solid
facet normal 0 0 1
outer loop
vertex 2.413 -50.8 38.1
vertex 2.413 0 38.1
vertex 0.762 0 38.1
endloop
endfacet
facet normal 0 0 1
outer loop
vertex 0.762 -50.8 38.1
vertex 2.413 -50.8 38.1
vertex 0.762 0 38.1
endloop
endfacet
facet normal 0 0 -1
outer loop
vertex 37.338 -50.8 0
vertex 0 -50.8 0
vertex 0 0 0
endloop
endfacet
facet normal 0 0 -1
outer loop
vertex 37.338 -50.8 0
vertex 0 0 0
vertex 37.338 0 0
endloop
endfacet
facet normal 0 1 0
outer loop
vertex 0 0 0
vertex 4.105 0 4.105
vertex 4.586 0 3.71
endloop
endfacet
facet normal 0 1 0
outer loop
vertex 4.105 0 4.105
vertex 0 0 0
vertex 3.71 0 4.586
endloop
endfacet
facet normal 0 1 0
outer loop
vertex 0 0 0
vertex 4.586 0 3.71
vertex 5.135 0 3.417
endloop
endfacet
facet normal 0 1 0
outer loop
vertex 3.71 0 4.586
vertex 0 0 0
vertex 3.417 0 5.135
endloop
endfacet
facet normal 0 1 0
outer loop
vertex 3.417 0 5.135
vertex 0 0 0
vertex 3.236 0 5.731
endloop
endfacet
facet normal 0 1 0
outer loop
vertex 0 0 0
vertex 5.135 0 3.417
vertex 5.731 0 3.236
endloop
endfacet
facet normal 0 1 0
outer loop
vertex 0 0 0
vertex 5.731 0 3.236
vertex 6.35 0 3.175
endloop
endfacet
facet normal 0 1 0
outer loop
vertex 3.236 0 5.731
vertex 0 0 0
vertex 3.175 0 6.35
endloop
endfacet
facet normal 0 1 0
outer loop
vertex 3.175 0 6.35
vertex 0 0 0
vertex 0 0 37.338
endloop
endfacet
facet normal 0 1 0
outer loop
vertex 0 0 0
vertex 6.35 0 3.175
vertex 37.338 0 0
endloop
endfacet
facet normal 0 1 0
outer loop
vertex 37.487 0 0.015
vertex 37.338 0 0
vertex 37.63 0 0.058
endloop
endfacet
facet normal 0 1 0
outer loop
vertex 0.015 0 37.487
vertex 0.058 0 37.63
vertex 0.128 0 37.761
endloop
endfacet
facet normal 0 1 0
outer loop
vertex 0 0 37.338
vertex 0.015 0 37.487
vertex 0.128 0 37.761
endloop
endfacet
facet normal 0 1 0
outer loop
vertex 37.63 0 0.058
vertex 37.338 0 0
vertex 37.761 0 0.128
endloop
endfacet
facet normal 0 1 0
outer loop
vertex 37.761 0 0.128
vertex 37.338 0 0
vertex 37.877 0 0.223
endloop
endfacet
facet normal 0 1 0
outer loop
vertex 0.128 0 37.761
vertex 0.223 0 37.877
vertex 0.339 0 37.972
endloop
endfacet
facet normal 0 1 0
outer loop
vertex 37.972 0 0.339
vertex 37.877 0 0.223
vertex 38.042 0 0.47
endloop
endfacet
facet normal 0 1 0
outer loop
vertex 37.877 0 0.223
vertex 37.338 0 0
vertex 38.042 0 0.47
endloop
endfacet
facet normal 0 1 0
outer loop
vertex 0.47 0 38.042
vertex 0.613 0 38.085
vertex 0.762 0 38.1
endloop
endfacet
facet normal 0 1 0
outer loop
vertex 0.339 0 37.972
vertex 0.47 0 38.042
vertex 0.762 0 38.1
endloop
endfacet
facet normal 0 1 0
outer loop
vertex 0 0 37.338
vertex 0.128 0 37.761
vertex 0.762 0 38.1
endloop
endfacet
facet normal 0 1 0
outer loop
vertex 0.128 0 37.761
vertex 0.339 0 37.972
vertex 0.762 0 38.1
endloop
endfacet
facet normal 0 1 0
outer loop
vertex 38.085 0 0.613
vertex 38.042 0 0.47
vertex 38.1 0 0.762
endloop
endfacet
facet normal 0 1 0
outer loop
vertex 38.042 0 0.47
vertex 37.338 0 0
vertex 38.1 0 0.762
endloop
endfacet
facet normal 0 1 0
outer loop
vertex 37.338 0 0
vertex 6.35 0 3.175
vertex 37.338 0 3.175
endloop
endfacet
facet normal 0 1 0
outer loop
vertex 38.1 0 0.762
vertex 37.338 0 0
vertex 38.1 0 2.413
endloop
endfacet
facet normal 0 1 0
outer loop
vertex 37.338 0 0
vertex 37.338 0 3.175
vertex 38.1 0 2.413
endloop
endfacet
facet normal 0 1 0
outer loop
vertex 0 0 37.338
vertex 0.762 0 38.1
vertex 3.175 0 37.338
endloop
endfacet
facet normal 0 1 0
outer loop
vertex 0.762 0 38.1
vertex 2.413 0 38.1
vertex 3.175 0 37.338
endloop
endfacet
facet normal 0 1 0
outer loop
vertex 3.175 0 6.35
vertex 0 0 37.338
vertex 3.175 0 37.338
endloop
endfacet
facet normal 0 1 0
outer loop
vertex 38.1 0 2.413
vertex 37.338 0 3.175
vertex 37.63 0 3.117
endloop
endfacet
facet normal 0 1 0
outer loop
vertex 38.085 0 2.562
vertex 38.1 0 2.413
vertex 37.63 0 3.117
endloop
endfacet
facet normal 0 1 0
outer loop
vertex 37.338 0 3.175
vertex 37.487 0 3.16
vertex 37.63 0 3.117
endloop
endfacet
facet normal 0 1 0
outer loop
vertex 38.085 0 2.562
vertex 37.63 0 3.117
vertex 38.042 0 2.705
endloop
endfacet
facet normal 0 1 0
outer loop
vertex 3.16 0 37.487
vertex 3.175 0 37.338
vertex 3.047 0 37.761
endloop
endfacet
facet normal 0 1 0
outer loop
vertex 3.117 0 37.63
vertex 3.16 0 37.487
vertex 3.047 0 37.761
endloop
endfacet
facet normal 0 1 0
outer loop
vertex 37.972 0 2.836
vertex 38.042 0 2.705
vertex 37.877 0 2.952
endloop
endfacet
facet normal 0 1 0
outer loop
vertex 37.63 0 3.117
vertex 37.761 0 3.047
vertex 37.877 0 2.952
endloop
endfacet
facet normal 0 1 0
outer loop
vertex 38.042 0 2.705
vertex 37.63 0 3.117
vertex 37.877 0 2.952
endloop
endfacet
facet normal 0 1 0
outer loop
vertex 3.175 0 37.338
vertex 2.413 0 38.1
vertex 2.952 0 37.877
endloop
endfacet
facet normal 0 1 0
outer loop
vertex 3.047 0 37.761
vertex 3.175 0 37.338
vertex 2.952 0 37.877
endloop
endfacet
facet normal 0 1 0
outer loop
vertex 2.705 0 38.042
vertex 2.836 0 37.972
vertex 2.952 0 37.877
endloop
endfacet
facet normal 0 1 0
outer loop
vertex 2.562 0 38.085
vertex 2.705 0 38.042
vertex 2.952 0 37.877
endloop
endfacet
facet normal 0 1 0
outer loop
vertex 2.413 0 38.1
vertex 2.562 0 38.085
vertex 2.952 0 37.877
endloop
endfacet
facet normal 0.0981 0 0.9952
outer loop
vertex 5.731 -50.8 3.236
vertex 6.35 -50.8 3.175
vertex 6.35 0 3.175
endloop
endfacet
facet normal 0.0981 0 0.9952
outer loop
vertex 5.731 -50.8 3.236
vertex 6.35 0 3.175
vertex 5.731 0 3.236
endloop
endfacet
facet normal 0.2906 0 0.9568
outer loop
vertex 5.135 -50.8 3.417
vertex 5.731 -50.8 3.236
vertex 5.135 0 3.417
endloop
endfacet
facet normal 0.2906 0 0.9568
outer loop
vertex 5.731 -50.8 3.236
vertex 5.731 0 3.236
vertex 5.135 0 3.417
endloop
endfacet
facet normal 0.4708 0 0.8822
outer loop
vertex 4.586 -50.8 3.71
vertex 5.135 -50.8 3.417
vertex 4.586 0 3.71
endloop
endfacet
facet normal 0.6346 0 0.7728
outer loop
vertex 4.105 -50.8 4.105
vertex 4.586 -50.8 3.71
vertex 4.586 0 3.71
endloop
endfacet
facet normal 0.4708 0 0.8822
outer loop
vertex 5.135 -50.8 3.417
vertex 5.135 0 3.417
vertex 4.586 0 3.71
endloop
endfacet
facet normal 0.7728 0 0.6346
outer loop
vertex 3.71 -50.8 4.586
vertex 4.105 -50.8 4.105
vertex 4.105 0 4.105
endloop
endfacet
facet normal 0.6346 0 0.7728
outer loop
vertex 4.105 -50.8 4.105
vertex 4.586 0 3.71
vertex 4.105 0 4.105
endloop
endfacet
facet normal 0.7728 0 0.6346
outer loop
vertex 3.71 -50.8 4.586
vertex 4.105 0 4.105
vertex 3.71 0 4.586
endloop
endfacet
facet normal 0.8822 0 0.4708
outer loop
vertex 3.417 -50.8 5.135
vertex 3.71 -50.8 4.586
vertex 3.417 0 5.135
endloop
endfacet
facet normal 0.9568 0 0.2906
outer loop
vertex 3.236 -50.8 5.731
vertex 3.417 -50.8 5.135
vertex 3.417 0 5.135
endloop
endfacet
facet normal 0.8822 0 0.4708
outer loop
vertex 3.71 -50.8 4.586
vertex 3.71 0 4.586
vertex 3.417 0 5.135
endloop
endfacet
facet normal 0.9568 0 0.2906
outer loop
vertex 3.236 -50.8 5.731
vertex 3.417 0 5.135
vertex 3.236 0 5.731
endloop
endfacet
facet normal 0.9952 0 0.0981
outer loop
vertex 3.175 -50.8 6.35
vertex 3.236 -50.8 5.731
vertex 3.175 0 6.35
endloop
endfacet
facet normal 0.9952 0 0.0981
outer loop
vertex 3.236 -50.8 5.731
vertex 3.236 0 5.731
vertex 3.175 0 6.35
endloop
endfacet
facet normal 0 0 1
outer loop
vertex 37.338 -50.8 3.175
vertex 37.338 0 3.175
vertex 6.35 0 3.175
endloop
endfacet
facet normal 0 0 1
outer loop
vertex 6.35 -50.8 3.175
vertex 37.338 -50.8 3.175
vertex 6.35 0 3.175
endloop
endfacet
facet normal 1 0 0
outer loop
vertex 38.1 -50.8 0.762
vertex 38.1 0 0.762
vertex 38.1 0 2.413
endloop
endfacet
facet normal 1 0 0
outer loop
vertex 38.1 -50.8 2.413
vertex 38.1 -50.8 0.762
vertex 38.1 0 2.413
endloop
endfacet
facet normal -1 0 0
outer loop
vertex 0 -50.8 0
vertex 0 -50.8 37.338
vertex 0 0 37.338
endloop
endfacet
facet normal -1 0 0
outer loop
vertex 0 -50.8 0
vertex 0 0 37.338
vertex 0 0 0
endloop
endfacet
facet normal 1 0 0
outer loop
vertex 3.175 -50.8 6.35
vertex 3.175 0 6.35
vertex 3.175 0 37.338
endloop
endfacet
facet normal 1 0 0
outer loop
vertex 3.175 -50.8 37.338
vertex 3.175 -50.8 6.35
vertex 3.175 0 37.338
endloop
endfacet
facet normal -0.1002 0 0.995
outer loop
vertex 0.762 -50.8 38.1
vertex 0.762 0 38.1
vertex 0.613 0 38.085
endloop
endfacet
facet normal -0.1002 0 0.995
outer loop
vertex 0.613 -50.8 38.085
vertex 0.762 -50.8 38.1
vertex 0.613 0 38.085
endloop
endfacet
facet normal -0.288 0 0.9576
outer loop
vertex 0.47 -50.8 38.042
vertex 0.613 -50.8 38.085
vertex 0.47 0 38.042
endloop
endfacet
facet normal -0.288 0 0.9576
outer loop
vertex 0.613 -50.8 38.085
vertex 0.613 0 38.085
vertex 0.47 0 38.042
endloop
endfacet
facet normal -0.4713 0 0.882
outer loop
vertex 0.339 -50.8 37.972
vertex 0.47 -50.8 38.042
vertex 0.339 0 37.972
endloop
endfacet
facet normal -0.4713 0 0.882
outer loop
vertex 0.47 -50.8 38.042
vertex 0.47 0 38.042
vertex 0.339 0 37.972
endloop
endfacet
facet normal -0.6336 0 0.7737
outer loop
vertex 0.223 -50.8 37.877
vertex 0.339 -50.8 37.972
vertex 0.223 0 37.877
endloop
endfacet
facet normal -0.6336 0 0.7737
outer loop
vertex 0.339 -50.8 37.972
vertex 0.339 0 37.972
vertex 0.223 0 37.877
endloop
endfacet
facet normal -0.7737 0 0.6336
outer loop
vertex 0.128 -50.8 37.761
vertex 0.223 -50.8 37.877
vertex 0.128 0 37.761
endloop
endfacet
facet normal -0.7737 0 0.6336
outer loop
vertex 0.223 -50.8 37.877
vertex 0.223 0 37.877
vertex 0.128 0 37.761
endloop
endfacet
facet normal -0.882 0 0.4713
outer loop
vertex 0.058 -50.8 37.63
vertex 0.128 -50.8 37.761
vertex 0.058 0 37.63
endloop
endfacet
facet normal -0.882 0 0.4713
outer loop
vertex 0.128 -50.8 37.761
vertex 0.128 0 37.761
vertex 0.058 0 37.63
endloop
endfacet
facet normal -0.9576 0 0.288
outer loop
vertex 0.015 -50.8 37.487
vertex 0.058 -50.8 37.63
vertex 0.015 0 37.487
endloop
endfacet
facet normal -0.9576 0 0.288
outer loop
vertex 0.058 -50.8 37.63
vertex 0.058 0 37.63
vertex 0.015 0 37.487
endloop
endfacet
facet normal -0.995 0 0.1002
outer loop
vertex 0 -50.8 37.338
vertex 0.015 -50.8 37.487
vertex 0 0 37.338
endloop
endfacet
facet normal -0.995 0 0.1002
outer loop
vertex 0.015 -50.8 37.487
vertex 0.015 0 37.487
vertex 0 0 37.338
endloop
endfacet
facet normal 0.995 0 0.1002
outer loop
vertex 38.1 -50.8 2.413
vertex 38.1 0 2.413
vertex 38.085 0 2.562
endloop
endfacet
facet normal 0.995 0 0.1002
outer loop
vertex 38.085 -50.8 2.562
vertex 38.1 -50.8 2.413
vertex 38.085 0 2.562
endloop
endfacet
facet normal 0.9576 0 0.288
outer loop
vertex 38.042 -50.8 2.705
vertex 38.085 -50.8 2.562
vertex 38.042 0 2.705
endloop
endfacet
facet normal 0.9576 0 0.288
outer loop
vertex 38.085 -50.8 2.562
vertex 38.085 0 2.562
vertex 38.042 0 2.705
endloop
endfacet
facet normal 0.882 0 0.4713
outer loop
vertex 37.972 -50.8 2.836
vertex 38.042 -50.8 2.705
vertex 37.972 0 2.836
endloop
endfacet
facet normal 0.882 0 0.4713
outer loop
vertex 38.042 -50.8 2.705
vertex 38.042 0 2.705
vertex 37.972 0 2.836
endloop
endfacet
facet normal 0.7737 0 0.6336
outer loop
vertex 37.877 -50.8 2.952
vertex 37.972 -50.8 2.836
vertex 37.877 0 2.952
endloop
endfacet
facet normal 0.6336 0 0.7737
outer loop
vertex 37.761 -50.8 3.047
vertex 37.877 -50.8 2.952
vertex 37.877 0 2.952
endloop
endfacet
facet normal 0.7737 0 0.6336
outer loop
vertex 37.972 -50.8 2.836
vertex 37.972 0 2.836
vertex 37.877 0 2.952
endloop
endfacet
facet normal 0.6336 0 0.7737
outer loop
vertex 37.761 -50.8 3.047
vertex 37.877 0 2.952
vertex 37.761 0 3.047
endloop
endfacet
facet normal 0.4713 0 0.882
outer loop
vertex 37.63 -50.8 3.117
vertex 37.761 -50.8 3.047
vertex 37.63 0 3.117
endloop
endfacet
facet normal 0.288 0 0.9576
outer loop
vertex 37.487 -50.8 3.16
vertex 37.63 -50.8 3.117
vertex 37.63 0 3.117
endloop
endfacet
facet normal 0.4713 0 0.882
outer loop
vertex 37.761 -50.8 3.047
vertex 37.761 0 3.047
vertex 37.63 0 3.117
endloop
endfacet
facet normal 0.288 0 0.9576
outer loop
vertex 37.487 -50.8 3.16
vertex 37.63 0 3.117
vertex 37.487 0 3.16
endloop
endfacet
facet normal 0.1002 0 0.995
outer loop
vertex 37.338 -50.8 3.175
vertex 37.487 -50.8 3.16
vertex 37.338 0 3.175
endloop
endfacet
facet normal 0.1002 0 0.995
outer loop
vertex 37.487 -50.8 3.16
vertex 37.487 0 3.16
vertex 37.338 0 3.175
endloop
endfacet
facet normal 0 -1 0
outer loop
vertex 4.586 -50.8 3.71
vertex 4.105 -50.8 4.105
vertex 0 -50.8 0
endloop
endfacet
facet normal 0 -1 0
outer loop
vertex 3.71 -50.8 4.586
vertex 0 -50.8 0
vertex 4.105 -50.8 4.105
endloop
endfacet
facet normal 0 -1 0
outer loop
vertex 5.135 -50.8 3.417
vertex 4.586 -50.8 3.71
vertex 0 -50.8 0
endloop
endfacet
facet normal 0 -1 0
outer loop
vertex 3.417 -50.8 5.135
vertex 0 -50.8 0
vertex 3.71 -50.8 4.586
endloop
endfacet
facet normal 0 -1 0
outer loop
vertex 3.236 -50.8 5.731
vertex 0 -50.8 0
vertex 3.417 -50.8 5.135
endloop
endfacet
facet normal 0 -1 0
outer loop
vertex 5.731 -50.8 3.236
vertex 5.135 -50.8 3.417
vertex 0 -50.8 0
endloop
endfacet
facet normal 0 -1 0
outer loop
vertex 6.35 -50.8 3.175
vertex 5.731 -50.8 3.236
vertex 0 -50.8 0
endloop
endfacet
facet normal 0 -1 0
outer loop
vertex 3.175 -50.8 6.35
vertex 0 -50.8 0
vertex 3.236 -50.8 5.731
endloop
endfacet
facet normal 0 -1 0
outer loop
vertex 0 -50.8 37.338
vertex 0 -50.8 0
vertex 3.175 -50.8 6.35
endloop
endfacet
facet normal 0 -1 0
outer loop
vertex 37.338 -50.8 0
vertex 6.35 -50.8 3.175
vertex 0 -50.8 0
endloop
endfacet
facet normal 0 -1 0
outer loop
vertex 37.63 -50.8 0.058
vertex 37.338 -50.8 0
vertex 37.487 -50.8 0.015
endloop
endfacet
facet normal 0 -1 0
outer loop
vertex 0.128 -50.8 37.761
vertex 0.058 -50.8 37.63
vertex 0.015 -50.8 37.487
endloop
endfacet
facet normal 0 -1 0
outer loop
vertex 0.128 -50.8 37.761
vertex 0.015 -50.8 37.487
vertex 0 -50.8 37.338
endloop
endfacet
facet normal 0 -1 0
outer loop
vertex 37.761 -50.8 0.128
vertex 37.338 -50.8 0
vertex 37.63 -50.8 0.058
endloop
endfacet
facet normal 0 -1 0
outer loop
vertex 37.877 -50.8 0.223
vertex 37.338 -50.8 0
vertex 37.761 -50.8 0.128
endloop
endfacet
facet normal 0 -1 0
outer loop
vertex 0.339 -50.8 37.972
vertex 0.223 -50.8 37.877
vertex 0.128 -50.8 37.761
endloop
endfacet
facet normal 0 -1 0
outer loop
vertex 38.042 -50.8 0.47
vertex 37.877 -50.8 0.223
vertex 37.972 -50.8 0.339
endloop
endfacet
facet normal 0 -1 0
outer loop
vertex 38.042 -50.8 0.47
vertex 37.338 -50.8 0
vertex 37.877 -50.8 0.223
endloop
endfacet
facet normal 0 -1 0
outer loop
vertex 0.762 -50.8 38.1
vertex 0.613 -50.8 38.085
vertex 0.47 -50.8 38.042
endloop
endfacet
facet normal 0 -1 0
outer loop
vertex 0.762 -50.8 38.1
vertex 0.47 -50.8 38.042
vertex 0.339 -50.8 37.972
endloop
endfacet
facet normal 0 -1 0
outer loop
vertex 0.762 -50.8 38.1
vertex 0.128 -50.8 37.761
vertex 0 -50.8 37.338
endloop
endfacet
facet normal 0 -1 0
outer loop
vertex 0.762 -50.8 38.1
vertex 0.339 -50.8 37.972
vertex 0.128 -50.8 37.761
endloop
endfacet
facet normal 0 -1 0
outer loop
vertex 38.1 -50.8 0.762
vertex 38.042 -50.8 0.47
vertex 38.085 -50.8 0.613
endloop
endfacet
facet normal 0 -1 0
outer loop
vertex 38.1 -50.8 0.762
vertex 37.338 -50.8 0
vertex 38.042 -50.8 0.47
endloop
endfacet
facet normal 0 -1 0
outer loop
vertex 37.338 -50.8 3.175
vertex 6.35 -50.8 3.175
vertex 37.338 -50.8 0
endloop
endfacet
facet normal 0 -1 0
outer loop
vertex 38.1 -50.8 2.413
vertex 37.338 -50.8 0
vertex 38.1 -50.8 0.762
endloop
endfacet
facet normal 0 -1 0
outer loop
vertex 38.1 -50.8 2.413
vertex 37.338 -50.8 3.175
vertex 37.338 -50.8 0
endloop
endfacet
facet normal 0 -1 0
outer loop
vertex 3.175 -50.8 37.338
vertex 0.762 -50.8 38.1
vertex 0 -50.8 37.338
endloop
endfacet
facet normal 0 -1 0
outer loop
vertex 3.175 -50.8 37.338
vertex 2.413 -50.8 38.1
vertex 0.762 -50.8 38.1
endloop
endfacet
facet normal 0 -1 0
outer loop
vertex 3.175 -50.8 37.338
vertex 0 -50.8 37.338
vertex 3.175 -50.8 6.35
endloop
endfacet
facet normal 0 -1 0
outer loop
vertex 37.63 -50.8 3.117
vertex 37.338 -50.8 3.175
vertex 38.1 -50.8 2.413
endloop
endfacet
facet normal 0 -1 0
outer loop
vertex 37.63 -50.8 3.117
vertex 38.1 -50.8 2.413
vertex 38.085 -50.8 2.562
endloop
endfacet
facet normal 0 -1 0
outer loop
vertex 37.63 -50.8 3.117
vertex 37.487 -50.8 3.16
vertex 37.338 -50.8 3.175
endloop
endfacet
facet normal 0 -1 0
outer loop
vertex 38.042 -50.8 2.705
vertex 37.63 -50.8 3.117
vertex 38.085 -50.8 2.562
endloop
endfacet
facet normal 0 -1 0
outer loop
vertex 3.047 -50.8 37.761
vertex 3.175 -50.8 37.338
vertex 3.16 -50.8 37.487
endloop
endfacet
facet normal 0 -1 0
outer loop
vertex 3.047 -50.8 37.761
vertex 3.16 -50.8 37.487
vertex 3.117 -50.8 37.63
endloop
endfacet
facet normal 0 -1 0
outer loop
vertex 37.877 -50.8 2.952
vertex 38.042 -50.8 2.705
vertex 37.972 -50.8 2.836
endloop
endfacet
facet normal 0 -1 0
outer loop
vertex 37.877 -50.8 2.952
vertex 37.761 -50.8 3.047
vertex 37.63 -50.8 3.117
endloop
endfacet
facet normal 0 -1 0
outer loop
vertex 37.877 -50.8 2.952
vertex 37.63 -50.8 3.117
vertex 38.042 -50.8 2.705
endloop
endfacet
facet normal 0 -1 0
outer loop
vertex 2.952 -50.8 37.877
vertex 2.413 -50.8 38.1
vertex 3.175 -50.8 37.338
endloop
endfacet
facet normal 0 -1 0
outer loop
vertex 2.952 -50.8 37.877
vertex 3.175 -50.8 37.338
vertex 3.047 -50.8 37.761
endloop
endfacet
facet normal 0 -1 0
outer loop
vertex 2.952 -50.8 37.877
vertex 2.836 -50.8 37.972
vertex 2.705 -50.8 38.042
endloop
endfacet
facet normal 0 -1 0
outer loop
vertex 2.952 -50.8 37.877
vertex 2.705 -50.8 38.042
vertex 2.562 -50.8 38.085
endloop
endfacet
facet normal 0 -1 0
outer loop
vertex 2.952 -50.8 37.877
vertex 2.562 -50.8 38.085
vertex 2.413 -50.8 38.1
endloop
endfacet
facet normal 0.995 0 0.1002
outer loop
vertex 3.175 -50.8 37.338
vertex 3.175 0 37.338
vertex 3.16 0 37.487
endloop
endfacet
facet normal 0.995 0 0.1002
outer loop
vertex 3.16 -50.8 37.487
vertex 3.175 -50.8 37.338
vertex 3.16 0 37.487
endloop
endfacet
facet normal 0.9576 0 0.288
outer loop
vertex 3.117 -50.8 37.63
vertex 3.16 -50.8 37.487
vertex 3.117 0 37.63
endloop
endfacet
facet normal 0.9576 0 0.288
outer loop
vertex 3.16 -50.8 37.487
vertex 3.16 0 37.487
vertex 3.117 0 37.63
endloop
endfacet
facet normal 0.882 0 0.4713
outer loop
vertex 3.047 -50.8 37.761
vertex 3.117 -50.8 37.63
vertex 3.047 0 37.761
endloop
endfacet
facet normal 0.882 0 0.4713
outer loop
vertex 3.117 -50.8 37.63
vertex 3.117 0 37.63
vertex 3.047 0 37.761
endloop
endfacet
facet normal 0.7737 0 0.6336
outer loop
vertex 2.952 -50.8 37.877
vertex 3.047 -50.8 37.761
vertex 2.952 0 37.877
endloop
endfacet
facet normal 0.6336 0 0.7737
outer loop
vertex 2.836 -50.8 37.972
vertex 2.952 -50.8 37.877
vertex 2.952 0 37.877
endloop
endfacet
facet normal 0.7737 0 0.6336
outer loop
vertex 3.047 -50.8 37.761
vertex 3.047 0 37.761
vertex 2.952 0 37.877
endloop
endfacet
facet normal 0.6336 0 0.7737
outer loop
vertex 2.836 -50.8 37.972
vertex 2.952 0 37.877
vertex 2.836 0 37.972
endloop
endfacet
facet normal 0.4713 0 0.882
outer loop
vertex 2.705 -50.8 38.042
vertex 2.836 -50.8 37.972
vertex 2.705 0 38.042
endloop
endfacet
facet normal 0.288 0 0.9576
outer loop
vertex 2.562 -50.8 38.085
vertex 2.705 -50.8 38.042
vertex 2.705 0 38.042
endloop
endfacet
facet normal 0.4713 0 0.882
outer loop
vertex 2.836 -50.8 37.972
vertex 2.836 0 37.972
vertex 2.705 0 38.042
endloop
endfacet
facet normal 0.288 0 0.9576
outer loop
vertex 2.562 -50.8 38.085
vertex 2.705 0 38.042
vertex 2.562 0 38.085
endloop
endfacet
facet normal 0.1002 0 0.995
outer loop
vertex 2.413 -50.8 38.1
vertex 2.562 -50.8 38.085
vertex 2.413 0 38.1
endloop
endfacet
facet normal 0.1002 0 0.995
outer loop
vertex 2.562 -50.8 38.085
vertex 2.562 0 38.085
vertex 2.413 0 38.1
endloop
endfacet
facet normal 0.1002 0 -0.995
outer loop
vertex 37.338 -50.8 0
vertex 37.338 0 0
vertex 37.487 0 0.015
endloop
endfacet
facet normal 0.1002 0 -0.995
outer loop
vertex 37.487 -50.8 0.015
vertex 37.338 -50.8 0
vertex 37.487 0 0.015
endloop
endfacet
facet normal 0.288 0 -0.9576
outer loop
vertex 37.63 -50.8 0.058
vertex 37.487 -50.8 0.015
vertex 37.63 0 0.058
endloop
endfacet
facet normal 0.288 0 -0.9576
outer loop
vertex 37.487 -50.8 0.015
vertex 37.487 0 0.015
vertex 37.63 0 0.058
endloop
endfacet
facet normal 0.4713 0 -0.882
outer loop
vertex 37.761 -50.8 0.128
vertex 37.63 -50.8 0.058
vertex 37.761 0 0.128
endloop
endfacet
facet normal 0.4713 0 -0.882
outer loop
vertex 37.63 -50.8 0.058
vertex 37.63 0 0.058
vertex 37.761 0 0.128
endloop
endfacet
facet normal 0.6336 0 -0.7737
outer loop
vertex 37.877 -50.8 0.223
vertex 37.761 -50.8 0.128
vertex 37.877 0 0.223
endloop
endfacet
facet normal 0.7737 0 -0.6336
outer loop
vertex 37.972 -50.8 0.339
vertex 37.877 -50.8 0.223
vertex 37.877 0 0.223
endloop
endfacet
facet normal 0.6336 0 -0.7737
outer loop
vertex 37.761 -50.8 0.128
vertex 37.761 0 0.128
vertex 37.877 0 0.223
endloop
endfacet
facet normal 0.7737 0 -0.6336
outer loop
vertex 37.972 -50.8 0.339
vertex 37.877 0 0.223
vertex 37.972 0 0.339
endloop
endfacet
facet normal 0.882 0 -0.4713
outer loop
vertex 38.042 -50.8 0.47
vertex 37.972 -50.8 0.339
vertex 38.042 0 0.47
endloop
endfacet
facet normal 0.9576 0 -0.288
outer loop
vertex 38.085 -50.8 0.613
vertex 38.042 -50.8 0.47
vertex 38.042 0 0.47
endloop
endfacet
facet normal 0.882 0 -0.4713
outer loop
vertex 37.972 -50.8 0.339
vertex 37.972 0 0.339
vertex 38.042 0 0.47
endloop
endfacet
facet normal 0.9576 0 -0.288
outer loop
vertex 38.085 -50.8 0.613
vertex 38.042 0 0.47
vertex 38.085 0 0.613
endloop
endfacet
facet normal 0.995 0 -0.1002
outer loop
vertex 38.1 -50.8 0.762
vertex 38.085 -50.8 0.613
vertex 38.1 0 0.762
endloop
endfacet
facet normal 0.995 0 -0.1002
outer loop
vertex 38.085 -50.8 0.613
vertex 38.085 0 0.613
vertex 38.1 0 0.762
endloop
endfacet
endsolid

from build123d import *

# Parameters (mm, degrees)
F1_DEPTH = 50.8


with BuildPart() as f1:
    # F0 (on Front) → F1 (new body)
    with BuildSketch(Plane.XZ):
        with BuildLine():
            Line((0, 37.338), (0, 0))
            Line((0, 0), (37.338, 0))
            ThreePointArc((37.338, 0), (37.876815, 0.223185), (38.1, 0.762))
            Line((38.1, 0.762), (38.1, 2.413))
            ThreePointArc((38.1, 2.413), (37.876815, 2.951815), (37.338, 3.175))
            Line((37.338, 3.175), (6.35, 3.175))
            ThreePointArc((6.35, 3.175), (4.104936, 4.104936), (3.175, 6.35))
            Line((3.175, 6.35), (3.175, 37.338))
            ThreePointArc((3.175, 37.338), (2.951815, 37.876815), (2.413, 38.1))
            Line((2.413, 38.1), (0.762, 38.1))
            ThreePointArc((0.762, 38.1), (0.223185, 37.876815), (0, 37.338))
        make_face()
    extrude(amount=F1_DEPTH)


solid = f1.part
